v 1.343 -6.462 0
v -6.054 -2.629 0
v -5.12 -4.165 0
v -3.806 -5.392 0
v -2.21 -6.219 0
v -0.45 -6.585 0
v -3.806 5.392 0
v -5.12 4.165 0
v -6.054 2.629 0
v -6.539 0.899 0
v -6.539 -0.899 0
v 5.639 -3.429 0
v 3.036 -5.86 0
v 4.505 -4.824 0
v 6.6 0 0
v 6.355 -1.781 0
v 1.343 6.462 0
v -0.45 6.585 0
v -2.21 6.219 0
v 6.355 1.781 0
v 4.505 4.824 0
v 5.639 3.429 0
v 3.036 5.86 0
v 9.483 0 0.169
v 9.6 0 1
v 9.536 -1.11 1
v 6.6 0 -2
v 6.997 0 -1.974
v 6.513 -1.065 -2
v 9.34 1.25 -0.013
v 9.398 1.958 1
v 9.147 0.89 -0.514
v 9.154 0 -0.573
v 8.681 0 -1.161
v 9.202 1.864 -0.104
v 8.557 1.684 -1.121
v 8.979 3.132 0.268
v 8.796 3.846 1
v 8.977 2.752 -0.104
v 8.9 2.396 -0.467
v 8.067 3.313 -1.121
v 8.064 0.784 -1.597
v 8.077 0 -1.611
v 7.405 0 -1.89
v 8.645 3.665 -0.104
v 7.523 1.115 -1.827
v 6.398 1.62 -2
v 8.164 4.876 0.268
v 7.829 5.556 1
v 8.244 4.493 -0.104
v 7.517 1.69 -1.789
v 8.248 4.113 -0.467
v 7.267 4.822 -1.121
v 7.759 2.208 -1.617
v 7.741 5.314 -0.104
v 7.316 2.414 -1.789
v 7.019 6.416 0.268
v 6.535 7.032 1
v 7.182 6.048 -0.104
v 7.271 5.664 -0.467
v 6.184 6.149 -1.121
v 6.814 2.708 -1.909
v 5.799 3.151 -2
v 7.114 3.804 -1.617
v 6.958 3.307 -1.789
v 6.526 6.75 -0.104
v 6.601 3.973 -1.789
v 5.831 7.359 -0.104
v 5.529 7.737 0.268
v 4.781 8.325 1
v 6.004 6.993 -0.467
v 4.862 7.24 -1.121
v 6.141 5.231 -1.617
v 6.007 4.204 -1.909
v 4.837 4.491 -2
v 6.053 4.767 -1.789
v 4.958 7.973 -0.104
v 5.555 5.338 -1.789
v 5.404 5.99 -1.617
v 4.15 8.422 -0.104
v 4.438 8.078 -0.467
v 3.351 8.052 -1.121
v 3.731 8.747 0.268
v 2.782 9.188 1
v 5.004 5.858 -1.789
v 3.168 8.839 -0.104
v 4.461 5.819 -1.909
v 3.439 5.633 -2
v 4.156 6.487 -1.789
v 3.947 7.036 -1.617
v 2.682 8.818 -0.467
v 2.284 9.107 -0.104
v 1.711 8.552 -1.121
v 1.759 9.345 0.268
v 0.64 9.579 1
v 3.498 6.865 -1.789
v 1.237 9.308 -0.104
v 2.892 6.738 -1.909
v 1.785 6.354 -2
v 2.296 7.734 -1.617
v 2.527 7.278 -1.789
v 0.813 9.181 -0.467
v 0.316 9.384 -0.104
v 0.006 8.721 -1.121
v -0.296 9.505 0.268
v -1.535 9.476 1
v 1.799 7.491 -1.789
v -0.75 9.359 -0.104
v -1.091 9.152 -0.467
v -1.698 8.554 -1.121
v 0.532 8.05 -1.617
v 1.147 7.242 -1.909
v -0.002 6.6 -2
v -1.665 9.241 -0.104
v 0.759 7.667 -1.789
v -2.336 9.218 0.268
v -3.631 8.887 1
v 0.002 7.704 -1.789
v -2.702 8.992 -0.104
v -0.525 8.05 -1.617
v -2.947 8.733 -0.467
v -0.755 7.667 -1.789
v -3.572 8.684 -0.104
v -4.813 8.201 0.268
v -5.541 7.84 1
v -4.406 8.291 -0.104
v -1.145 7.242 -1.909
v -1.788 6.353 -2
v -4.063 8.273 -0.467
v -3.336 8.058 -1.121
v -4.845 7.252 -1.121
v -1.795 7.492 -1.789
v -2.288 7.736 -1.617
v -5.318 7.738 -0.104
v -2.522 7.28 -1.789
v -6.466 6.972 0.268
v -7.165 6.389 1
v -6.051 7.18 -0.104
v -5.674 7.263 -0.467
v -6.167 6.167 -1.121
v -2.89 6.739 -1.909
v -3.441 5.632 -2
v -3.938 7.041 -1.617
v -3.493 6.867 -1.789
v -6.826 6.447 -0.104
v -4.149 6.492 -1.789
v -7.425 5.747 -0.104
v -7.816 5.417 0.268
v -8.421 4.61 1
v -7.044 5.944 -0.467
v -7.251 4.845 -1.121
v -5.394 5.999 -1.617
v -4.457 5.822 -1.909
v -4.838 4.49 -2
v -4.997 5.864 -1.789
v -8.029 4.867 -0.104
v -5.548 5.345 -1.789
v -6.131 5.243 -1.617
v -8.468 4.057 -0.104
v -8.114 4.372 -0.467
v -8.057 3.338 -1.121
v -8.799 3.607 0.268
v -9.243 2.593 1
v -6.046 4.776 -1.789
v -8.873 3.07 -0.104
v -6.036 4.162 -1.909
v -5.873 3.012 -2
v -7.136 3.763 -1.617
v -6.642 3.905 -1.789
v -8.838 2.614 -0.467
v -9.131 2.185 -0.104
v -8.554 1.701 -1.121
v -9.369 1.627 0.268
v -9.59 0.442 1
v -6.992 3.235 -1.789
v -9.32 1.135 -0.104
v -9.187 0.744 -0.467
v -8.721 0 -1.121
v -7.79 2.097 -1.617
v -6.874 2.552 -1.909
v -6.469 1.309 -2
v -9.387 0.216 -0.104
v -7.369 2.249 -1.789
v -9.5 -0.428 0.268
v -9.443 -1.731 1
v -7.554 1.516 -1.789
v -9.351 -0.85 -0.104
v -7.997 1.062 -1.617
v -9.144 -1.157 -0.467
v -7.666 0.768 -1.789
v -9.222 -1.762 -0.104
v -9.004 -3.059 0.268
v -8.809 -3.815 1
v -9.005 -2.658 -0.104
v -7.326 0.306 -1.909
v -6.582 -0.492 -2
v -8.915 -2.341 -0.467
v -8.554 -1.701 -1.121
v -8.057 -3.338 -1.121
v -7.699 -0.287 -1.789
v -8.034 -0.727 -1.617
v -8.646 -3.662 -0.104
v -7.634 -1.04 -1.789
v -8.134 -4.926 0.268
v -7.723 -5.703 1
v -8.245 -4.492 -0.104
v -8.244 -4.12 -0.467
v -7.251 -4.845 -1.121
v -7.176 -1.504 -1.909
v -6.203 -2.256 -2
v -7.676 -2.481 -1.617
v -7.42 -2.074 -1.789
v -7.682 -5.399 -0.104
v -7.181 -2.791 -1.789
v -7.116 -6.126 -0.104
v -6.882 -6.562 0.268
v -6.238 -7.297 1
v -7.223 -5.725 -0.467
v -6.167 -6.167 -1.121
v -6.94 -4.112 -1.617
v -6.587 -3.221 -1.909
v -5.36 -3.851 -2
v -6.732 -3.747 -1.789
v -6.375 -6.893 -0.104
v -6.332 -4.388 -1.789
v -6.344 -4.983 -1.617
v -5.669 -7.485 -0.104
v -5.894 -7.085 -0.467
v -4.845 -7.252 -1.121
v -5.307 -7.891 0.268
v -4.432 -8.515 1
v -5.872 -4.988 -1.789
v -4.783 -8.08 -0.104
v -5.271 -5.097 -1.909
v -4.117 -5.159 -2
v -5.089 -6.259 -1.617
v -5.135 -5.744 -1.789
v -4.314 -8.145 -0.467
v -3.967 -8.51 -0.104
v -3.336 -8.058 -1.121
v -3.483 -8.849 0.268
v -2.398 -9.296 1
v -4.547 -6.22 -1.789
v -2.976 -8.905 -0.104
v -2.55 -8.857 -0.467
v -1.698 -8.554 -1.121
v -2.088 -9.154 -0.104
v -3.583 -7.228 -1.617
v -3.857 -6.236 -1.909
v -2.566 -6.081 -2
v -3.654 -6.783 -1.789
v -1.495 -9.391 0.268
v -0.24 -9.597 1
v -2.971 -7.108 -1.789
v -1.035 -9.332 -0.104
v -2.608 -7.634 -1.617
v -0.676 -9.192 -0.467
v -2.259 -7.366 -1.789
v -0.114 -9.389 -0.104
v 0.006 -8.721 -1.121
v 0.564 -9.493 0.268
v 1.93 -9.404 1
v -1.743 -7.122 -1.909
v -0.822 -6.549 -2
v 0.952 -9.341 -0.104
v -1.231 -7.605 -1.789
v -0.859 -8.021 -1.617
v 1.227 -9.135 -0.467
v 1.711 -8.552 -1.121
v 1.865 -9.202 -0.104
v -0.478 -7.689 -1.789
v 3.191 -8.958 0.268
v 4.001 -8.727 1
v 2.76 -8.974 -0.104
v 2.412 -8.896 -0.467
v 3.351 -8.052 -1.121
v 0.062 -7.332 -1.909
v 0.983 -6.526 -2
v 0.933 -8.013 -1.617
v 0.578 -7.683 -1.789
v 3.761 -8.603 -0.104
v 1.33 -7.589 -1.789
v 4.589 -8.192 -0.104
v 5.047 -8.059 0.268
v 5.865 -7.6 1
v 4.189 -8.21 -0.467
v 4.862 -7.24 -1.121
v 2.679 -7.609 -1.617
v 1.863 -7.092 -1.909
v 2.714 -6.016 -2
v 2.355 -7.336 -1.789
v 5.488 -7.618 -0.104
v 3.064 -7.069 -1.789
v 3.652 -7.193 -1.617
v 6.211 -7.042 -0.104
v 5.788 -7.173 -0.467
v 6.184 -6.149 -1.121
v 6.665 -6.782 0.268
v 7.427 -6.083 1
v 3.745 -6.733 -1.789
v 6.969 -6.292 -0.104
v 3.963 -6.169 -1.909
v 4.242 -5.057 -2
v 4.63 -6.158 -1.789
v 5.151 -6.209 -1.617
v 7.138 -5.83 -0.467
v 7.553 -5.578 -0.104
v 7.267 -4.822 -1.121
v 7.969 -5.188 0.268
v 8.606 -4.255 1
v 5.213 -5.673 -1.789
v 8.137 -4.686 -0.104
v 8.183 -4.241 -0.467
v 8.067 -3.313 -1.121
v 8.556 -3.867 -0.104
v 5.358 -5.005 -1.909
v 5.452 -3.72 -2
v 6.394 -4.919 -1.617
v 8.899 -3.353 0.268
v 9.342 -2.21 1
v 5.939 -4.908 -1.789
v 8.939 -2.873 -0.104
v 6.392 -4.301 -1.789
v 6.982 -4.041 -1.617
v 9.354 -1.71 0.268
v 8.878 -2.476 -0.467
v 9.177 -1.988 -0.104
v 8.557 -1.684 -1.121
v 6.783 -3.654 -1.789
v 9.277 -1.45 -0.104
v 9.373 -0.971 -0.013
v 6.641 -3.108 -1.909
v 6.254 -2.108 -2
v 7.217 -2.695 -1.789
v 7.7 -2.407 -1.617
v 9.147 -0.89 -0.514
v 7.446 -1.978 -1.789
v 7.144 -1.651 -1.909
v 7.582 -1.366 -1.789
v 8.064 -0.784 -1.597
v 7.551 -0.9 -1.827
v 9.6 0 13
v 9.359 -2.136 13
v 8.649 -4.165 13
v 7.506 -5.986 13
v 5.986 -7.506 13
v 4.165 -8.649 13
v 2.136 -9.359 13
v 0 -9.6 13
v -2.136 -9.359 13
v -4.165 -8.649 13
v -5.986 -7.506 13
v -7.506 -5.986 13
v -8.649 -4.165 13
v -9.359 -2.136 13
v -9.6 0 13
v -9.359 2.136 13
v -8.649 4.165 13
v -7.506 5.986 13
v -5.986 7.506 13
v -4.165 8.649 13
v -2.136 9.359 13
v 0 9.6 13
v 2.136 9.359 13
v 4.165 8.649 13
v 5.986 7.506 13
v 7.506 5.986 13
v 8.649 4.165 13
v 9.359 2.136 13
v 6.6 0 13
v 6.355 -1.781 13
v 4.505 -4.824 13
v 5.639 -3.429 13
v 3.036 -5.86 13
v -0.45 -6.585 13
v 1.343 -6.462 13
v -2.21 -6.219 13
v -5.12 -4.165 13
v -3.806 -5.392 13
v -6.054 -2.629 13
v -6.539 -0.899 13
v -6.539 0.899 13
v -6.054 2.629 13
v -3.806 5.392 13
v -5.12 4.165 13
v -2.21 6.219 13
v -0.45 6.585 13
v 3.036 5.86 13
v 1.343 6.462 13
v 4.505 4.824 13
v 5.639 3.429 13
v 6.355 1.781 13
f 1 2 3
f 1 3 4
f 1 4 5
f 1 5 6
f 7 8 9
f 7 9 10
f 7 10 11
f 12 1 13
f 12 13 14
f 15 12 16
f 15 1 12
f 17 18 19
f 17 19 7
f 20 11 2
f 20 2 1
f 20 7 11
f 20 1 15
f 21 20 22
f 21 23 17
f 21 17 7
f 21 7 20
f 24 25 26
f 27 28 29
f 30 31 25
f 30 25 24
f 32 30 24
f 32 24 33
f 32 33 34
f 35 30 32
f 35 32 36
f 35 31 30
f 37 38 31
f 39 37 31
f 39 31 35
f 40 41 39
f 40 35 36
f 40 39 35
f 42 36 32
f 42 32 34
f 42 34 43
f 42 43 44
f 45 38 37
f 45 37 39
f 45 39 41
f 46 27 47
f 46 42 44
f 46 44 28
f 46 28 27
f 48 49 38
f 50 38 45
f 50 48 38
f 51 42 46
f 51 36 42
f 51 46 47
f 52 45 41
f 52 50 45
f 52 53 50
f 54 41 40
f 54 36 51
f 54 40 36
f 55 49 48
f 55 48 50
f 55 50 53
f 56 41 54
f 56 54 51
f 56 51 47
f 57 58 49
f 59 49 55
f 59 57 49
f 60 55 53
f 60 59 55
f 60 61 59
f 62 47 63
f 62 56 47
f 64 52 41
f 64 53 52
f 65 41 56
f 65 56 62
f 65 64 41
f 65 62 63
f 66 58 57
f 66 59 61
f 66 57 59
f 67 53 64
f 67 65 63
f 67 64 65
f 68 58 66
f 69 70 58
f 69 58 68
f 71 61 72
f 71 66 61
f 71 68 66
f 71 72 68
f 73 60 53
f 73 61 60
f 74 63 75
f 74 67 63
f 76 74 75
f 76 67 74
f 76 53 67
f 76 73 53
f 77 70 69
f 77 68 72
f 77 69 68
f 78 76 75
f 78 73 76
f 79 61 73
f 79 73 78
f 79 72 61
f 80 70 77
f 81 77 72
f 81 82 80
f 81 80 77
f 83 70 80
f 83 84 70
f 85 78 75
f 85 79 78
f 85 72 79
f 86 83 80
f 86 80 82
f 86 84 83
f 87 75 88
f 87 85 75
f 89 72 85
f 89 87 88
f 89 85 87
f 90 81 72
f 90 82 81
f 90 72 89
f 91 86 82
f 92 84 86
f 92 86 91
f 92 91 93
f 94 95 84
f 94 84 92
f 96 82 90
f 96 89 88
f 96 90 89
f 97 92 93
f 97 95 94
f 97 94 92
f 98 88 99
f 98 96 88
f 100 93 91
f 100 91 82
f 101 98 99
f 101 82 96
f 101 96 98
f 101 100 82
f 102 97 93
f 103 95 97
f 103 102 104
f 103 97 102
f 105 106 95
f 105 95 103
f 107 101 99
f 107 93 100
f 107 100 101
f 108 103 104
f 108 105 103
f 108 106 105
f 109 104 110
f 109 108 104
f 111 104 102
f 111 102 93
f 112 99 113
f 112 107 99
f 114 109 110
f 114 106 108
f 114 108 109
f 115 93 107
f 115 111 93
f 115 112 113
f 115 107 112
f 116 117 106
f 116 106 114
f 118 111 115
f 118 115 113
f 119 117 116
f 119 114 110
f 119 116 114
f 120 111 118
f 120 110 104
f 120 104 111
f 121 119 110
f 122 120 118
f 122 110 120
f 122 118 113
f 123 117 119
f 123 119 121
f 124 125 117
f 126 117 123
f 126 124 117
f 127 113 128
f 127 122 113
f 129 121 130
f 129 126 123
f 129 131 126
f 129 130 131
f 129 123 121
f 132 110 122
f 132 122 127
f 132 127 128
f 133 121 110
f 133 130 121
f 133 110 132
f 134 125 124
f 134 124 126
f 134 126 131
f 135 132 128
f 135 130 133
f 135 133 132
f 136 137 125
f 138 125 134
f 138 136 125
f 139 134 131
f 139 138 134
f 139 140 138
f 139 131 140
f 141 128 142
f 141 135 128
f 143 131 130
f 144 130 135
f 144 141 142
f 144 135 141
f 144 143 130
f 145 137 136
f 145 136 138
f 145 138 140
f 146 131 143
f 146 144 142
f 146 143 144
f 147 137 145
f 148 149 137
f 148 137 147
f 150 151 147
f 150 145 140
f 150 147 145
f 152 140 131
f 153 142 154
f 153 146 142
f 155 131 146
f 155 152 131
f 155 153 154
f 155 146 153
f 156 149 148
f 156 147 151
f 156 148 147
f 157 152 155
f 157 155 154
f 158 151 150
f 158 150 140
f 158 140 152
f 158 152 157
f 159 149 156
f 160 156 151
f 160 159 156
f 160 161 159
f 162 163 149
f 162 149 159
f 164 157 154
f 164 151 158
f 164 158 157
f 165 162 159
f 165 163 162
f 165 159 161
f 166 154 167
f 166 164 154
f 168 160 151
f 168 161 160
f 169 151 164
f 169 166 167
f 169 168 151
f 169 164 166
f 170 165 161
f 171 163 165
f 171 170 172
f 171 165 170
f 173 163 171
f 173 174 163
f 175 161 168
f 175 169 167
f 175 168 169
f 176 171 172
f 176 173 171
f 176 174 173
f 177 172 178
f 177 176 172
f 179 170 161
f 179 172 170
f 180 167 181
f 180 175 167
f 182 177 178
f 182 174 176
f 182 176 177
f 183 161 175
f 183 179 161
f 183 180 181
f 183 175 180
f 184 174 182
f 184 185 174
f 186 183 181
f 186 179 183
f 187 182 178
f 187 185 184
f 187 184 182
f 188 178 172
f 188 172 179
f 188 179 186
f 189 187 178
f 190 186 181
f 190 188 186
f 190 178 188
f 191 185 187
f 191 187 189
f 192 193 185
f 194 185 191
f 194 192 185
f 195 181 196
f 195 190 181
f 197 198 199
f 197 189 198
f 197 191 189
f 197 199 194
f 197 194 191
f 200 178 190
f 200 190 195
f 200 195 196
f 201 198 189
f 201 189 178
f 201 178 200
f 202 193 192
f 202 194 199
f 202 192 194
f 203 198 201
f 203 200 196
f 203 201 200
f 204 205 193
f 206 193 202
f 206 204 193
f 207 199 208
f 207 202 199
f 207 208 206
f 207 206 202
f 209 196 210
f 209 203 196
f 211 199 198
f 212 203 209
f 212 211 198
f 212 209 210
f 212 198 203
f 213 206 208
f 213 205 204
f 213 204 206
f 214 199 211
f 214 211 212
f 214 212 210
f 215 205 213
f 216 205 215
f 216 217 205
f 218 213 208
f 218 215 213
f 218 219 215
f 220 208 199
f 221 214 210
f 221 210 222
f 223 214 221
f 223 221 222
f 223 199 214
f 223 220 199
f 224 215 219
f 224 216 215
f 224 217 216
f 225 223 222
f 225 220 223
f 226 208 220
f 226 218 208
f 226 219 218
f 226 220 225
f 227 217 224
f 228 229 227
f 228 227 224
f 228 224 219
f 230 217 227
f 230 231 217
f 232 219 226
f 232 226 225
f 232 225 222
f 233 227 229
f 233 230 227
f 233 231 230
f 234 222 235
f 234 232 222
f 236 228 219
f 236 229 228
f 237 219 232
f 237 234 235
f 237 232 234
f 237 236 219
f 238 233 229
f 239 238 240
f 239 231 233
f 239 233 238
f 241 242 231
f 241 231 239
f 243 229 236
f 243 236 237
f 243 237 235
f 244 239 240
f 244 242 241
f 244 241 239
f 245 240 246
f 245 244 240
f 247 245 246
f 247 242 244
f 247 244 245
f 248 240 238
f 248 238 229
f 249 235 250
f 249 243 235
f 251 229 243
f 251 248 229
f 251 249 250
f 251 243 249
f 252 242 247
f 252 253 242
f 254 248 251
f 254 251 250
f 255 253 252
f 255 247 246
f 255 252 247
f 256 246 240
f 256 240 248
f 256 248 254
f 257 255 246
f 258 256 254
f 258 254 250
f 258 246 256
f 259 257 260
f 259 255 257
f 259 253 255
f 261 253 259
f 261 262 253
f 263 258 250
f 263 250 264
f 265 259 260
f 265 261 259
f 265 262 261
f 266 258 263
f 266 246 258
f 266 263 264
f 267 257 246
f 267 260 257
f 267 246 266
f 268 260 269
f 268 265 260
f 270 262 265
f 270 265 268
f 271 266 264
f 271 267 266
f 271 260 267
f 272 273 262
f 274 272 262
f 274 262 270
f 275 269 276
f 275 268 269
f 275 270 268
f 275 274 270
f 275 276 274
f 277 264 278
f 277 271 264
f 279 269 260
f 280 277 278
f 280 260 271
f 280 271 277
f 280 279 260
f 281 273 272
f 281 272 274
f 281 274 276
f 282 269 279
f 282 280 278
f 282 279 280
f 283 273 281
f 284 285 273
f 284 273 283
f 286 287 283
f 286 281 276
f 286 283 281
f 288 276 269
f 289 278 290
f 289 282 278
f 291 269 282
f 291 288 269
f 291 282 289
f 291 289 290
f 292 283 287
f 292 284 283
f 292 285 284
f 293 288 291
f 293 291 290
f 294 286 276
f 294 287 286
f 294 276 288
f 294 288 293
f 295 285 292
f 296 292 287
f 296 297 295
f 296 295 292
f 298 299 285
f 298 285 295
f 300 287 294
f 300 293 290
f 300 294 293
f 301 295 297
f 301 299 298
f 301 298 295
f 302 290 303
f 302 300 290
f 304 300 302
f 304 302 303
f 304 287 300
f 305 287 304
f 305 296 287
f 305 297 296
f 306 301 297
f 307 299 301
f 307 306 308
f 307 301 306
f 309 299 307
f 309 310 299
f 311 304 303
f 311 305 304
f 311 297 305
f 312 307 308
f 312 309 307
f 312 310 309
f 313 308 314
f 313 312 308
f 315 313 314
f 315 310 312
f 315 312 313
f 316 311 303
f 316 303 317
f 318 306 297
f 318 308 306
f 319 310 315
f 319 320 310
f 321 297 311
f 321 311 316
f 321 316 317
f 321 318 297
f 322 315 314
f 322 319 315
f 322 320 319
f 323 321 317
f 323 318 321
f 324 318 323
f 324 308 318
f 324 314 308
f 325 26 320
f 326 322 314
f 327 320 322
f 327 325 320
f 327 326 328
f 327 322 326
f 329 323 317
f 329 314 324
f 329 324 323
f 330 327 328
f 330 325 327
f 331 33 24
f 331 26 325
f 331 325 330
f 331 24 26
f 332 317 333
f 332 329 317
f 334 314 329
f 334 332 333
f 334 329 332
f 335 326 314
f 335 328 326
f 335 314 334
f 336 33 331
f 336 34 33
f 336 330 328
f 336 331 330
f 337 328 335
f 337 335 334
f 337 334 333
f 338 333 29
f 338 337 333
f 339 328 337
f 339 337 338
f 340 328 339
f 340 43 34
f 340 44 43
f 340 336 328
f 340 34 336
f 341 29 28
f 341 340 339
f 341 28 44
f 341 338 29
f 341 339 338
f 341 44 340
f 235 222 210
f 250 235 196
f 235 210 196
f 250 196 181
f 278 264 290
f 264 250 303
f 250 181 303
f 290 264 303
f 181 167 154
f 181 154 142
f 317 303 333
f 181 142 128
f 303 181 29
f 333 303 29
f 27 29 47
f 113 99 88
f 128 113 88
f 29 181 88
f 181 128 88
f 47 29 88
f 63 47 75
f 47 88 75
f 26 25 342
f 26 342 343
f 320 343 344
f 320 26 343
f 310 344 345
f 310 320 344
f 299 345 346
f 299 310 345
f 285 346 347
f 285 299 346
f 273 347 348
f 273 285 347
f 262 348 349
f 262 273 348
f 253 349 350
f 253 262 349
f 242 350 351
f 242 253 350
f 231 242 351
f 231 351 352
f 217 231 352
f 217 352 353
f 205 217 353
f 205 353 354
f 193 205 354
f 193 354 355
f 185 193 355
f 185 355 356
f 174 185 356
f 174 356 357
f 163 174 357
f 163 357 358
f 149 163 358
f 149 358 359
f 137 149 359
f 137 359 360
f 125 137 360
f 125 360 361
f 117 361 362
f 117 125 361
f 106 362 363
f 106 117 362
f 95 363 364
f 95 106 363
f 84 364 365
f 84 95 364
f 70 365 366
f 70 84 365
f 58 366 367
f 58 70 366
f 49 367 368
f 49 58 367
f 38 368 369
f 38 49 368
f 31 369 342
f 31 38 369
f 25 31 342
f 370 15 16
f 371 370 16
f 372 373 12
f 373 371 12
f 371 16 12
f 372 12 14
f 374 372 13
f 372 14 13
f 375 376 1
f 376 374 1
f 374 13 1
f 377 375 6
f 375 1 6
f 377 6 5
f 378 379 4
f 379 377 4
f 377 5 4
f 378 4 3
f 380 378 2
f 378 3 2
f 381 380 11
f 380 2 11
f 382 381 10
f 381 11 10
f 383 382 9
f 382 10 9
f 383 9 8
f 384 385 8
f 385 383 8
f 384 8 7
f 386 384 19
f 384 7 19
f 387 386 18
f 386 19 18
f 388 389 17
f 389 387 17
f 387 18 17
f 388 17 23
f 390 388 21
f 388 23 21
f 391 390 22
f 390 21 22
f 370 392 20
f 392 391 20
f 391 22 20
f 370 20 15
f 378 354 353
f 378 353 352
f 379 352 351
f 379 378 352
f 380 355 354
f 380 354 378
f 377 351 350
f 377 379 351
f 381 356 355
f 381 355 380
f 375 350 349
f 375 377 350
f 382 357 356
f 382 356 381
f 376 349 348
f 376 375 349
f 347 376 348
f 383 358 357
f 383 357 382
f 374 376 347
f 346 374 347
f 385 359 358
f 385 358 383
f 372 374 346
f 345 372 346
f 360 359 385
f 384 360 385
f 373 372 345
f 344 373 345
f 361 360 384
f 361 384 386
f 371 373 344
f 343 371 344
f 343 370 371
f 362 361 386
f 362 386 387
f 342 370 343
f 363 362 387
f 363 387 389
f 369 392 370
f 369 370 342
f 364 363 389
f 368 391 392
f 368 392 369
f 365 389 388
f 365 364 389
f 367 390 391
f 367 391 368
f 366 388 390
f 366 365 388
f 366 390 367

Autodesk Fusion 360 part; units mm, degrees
sketch "Sketch1" plane through (0, 0, 0) normal (0, 0, 1) x (1, 0, 0)
  circle A0 centre (0, 0) radius 6.6
  circle A1 centre (0, 0) radius 9.6
  dimension "d1" = 3
  dimension "d2" = 13.2
extrude "Extrude1" add sketch "Sketch1" along normal blind 13
extrude "Extrude2" add sketch "Sketch1" against normal blind 2 contours A0 | A1
fillet "Fillet1" radius 3 1 edges at (-8.9503, 3.4715, -2)
